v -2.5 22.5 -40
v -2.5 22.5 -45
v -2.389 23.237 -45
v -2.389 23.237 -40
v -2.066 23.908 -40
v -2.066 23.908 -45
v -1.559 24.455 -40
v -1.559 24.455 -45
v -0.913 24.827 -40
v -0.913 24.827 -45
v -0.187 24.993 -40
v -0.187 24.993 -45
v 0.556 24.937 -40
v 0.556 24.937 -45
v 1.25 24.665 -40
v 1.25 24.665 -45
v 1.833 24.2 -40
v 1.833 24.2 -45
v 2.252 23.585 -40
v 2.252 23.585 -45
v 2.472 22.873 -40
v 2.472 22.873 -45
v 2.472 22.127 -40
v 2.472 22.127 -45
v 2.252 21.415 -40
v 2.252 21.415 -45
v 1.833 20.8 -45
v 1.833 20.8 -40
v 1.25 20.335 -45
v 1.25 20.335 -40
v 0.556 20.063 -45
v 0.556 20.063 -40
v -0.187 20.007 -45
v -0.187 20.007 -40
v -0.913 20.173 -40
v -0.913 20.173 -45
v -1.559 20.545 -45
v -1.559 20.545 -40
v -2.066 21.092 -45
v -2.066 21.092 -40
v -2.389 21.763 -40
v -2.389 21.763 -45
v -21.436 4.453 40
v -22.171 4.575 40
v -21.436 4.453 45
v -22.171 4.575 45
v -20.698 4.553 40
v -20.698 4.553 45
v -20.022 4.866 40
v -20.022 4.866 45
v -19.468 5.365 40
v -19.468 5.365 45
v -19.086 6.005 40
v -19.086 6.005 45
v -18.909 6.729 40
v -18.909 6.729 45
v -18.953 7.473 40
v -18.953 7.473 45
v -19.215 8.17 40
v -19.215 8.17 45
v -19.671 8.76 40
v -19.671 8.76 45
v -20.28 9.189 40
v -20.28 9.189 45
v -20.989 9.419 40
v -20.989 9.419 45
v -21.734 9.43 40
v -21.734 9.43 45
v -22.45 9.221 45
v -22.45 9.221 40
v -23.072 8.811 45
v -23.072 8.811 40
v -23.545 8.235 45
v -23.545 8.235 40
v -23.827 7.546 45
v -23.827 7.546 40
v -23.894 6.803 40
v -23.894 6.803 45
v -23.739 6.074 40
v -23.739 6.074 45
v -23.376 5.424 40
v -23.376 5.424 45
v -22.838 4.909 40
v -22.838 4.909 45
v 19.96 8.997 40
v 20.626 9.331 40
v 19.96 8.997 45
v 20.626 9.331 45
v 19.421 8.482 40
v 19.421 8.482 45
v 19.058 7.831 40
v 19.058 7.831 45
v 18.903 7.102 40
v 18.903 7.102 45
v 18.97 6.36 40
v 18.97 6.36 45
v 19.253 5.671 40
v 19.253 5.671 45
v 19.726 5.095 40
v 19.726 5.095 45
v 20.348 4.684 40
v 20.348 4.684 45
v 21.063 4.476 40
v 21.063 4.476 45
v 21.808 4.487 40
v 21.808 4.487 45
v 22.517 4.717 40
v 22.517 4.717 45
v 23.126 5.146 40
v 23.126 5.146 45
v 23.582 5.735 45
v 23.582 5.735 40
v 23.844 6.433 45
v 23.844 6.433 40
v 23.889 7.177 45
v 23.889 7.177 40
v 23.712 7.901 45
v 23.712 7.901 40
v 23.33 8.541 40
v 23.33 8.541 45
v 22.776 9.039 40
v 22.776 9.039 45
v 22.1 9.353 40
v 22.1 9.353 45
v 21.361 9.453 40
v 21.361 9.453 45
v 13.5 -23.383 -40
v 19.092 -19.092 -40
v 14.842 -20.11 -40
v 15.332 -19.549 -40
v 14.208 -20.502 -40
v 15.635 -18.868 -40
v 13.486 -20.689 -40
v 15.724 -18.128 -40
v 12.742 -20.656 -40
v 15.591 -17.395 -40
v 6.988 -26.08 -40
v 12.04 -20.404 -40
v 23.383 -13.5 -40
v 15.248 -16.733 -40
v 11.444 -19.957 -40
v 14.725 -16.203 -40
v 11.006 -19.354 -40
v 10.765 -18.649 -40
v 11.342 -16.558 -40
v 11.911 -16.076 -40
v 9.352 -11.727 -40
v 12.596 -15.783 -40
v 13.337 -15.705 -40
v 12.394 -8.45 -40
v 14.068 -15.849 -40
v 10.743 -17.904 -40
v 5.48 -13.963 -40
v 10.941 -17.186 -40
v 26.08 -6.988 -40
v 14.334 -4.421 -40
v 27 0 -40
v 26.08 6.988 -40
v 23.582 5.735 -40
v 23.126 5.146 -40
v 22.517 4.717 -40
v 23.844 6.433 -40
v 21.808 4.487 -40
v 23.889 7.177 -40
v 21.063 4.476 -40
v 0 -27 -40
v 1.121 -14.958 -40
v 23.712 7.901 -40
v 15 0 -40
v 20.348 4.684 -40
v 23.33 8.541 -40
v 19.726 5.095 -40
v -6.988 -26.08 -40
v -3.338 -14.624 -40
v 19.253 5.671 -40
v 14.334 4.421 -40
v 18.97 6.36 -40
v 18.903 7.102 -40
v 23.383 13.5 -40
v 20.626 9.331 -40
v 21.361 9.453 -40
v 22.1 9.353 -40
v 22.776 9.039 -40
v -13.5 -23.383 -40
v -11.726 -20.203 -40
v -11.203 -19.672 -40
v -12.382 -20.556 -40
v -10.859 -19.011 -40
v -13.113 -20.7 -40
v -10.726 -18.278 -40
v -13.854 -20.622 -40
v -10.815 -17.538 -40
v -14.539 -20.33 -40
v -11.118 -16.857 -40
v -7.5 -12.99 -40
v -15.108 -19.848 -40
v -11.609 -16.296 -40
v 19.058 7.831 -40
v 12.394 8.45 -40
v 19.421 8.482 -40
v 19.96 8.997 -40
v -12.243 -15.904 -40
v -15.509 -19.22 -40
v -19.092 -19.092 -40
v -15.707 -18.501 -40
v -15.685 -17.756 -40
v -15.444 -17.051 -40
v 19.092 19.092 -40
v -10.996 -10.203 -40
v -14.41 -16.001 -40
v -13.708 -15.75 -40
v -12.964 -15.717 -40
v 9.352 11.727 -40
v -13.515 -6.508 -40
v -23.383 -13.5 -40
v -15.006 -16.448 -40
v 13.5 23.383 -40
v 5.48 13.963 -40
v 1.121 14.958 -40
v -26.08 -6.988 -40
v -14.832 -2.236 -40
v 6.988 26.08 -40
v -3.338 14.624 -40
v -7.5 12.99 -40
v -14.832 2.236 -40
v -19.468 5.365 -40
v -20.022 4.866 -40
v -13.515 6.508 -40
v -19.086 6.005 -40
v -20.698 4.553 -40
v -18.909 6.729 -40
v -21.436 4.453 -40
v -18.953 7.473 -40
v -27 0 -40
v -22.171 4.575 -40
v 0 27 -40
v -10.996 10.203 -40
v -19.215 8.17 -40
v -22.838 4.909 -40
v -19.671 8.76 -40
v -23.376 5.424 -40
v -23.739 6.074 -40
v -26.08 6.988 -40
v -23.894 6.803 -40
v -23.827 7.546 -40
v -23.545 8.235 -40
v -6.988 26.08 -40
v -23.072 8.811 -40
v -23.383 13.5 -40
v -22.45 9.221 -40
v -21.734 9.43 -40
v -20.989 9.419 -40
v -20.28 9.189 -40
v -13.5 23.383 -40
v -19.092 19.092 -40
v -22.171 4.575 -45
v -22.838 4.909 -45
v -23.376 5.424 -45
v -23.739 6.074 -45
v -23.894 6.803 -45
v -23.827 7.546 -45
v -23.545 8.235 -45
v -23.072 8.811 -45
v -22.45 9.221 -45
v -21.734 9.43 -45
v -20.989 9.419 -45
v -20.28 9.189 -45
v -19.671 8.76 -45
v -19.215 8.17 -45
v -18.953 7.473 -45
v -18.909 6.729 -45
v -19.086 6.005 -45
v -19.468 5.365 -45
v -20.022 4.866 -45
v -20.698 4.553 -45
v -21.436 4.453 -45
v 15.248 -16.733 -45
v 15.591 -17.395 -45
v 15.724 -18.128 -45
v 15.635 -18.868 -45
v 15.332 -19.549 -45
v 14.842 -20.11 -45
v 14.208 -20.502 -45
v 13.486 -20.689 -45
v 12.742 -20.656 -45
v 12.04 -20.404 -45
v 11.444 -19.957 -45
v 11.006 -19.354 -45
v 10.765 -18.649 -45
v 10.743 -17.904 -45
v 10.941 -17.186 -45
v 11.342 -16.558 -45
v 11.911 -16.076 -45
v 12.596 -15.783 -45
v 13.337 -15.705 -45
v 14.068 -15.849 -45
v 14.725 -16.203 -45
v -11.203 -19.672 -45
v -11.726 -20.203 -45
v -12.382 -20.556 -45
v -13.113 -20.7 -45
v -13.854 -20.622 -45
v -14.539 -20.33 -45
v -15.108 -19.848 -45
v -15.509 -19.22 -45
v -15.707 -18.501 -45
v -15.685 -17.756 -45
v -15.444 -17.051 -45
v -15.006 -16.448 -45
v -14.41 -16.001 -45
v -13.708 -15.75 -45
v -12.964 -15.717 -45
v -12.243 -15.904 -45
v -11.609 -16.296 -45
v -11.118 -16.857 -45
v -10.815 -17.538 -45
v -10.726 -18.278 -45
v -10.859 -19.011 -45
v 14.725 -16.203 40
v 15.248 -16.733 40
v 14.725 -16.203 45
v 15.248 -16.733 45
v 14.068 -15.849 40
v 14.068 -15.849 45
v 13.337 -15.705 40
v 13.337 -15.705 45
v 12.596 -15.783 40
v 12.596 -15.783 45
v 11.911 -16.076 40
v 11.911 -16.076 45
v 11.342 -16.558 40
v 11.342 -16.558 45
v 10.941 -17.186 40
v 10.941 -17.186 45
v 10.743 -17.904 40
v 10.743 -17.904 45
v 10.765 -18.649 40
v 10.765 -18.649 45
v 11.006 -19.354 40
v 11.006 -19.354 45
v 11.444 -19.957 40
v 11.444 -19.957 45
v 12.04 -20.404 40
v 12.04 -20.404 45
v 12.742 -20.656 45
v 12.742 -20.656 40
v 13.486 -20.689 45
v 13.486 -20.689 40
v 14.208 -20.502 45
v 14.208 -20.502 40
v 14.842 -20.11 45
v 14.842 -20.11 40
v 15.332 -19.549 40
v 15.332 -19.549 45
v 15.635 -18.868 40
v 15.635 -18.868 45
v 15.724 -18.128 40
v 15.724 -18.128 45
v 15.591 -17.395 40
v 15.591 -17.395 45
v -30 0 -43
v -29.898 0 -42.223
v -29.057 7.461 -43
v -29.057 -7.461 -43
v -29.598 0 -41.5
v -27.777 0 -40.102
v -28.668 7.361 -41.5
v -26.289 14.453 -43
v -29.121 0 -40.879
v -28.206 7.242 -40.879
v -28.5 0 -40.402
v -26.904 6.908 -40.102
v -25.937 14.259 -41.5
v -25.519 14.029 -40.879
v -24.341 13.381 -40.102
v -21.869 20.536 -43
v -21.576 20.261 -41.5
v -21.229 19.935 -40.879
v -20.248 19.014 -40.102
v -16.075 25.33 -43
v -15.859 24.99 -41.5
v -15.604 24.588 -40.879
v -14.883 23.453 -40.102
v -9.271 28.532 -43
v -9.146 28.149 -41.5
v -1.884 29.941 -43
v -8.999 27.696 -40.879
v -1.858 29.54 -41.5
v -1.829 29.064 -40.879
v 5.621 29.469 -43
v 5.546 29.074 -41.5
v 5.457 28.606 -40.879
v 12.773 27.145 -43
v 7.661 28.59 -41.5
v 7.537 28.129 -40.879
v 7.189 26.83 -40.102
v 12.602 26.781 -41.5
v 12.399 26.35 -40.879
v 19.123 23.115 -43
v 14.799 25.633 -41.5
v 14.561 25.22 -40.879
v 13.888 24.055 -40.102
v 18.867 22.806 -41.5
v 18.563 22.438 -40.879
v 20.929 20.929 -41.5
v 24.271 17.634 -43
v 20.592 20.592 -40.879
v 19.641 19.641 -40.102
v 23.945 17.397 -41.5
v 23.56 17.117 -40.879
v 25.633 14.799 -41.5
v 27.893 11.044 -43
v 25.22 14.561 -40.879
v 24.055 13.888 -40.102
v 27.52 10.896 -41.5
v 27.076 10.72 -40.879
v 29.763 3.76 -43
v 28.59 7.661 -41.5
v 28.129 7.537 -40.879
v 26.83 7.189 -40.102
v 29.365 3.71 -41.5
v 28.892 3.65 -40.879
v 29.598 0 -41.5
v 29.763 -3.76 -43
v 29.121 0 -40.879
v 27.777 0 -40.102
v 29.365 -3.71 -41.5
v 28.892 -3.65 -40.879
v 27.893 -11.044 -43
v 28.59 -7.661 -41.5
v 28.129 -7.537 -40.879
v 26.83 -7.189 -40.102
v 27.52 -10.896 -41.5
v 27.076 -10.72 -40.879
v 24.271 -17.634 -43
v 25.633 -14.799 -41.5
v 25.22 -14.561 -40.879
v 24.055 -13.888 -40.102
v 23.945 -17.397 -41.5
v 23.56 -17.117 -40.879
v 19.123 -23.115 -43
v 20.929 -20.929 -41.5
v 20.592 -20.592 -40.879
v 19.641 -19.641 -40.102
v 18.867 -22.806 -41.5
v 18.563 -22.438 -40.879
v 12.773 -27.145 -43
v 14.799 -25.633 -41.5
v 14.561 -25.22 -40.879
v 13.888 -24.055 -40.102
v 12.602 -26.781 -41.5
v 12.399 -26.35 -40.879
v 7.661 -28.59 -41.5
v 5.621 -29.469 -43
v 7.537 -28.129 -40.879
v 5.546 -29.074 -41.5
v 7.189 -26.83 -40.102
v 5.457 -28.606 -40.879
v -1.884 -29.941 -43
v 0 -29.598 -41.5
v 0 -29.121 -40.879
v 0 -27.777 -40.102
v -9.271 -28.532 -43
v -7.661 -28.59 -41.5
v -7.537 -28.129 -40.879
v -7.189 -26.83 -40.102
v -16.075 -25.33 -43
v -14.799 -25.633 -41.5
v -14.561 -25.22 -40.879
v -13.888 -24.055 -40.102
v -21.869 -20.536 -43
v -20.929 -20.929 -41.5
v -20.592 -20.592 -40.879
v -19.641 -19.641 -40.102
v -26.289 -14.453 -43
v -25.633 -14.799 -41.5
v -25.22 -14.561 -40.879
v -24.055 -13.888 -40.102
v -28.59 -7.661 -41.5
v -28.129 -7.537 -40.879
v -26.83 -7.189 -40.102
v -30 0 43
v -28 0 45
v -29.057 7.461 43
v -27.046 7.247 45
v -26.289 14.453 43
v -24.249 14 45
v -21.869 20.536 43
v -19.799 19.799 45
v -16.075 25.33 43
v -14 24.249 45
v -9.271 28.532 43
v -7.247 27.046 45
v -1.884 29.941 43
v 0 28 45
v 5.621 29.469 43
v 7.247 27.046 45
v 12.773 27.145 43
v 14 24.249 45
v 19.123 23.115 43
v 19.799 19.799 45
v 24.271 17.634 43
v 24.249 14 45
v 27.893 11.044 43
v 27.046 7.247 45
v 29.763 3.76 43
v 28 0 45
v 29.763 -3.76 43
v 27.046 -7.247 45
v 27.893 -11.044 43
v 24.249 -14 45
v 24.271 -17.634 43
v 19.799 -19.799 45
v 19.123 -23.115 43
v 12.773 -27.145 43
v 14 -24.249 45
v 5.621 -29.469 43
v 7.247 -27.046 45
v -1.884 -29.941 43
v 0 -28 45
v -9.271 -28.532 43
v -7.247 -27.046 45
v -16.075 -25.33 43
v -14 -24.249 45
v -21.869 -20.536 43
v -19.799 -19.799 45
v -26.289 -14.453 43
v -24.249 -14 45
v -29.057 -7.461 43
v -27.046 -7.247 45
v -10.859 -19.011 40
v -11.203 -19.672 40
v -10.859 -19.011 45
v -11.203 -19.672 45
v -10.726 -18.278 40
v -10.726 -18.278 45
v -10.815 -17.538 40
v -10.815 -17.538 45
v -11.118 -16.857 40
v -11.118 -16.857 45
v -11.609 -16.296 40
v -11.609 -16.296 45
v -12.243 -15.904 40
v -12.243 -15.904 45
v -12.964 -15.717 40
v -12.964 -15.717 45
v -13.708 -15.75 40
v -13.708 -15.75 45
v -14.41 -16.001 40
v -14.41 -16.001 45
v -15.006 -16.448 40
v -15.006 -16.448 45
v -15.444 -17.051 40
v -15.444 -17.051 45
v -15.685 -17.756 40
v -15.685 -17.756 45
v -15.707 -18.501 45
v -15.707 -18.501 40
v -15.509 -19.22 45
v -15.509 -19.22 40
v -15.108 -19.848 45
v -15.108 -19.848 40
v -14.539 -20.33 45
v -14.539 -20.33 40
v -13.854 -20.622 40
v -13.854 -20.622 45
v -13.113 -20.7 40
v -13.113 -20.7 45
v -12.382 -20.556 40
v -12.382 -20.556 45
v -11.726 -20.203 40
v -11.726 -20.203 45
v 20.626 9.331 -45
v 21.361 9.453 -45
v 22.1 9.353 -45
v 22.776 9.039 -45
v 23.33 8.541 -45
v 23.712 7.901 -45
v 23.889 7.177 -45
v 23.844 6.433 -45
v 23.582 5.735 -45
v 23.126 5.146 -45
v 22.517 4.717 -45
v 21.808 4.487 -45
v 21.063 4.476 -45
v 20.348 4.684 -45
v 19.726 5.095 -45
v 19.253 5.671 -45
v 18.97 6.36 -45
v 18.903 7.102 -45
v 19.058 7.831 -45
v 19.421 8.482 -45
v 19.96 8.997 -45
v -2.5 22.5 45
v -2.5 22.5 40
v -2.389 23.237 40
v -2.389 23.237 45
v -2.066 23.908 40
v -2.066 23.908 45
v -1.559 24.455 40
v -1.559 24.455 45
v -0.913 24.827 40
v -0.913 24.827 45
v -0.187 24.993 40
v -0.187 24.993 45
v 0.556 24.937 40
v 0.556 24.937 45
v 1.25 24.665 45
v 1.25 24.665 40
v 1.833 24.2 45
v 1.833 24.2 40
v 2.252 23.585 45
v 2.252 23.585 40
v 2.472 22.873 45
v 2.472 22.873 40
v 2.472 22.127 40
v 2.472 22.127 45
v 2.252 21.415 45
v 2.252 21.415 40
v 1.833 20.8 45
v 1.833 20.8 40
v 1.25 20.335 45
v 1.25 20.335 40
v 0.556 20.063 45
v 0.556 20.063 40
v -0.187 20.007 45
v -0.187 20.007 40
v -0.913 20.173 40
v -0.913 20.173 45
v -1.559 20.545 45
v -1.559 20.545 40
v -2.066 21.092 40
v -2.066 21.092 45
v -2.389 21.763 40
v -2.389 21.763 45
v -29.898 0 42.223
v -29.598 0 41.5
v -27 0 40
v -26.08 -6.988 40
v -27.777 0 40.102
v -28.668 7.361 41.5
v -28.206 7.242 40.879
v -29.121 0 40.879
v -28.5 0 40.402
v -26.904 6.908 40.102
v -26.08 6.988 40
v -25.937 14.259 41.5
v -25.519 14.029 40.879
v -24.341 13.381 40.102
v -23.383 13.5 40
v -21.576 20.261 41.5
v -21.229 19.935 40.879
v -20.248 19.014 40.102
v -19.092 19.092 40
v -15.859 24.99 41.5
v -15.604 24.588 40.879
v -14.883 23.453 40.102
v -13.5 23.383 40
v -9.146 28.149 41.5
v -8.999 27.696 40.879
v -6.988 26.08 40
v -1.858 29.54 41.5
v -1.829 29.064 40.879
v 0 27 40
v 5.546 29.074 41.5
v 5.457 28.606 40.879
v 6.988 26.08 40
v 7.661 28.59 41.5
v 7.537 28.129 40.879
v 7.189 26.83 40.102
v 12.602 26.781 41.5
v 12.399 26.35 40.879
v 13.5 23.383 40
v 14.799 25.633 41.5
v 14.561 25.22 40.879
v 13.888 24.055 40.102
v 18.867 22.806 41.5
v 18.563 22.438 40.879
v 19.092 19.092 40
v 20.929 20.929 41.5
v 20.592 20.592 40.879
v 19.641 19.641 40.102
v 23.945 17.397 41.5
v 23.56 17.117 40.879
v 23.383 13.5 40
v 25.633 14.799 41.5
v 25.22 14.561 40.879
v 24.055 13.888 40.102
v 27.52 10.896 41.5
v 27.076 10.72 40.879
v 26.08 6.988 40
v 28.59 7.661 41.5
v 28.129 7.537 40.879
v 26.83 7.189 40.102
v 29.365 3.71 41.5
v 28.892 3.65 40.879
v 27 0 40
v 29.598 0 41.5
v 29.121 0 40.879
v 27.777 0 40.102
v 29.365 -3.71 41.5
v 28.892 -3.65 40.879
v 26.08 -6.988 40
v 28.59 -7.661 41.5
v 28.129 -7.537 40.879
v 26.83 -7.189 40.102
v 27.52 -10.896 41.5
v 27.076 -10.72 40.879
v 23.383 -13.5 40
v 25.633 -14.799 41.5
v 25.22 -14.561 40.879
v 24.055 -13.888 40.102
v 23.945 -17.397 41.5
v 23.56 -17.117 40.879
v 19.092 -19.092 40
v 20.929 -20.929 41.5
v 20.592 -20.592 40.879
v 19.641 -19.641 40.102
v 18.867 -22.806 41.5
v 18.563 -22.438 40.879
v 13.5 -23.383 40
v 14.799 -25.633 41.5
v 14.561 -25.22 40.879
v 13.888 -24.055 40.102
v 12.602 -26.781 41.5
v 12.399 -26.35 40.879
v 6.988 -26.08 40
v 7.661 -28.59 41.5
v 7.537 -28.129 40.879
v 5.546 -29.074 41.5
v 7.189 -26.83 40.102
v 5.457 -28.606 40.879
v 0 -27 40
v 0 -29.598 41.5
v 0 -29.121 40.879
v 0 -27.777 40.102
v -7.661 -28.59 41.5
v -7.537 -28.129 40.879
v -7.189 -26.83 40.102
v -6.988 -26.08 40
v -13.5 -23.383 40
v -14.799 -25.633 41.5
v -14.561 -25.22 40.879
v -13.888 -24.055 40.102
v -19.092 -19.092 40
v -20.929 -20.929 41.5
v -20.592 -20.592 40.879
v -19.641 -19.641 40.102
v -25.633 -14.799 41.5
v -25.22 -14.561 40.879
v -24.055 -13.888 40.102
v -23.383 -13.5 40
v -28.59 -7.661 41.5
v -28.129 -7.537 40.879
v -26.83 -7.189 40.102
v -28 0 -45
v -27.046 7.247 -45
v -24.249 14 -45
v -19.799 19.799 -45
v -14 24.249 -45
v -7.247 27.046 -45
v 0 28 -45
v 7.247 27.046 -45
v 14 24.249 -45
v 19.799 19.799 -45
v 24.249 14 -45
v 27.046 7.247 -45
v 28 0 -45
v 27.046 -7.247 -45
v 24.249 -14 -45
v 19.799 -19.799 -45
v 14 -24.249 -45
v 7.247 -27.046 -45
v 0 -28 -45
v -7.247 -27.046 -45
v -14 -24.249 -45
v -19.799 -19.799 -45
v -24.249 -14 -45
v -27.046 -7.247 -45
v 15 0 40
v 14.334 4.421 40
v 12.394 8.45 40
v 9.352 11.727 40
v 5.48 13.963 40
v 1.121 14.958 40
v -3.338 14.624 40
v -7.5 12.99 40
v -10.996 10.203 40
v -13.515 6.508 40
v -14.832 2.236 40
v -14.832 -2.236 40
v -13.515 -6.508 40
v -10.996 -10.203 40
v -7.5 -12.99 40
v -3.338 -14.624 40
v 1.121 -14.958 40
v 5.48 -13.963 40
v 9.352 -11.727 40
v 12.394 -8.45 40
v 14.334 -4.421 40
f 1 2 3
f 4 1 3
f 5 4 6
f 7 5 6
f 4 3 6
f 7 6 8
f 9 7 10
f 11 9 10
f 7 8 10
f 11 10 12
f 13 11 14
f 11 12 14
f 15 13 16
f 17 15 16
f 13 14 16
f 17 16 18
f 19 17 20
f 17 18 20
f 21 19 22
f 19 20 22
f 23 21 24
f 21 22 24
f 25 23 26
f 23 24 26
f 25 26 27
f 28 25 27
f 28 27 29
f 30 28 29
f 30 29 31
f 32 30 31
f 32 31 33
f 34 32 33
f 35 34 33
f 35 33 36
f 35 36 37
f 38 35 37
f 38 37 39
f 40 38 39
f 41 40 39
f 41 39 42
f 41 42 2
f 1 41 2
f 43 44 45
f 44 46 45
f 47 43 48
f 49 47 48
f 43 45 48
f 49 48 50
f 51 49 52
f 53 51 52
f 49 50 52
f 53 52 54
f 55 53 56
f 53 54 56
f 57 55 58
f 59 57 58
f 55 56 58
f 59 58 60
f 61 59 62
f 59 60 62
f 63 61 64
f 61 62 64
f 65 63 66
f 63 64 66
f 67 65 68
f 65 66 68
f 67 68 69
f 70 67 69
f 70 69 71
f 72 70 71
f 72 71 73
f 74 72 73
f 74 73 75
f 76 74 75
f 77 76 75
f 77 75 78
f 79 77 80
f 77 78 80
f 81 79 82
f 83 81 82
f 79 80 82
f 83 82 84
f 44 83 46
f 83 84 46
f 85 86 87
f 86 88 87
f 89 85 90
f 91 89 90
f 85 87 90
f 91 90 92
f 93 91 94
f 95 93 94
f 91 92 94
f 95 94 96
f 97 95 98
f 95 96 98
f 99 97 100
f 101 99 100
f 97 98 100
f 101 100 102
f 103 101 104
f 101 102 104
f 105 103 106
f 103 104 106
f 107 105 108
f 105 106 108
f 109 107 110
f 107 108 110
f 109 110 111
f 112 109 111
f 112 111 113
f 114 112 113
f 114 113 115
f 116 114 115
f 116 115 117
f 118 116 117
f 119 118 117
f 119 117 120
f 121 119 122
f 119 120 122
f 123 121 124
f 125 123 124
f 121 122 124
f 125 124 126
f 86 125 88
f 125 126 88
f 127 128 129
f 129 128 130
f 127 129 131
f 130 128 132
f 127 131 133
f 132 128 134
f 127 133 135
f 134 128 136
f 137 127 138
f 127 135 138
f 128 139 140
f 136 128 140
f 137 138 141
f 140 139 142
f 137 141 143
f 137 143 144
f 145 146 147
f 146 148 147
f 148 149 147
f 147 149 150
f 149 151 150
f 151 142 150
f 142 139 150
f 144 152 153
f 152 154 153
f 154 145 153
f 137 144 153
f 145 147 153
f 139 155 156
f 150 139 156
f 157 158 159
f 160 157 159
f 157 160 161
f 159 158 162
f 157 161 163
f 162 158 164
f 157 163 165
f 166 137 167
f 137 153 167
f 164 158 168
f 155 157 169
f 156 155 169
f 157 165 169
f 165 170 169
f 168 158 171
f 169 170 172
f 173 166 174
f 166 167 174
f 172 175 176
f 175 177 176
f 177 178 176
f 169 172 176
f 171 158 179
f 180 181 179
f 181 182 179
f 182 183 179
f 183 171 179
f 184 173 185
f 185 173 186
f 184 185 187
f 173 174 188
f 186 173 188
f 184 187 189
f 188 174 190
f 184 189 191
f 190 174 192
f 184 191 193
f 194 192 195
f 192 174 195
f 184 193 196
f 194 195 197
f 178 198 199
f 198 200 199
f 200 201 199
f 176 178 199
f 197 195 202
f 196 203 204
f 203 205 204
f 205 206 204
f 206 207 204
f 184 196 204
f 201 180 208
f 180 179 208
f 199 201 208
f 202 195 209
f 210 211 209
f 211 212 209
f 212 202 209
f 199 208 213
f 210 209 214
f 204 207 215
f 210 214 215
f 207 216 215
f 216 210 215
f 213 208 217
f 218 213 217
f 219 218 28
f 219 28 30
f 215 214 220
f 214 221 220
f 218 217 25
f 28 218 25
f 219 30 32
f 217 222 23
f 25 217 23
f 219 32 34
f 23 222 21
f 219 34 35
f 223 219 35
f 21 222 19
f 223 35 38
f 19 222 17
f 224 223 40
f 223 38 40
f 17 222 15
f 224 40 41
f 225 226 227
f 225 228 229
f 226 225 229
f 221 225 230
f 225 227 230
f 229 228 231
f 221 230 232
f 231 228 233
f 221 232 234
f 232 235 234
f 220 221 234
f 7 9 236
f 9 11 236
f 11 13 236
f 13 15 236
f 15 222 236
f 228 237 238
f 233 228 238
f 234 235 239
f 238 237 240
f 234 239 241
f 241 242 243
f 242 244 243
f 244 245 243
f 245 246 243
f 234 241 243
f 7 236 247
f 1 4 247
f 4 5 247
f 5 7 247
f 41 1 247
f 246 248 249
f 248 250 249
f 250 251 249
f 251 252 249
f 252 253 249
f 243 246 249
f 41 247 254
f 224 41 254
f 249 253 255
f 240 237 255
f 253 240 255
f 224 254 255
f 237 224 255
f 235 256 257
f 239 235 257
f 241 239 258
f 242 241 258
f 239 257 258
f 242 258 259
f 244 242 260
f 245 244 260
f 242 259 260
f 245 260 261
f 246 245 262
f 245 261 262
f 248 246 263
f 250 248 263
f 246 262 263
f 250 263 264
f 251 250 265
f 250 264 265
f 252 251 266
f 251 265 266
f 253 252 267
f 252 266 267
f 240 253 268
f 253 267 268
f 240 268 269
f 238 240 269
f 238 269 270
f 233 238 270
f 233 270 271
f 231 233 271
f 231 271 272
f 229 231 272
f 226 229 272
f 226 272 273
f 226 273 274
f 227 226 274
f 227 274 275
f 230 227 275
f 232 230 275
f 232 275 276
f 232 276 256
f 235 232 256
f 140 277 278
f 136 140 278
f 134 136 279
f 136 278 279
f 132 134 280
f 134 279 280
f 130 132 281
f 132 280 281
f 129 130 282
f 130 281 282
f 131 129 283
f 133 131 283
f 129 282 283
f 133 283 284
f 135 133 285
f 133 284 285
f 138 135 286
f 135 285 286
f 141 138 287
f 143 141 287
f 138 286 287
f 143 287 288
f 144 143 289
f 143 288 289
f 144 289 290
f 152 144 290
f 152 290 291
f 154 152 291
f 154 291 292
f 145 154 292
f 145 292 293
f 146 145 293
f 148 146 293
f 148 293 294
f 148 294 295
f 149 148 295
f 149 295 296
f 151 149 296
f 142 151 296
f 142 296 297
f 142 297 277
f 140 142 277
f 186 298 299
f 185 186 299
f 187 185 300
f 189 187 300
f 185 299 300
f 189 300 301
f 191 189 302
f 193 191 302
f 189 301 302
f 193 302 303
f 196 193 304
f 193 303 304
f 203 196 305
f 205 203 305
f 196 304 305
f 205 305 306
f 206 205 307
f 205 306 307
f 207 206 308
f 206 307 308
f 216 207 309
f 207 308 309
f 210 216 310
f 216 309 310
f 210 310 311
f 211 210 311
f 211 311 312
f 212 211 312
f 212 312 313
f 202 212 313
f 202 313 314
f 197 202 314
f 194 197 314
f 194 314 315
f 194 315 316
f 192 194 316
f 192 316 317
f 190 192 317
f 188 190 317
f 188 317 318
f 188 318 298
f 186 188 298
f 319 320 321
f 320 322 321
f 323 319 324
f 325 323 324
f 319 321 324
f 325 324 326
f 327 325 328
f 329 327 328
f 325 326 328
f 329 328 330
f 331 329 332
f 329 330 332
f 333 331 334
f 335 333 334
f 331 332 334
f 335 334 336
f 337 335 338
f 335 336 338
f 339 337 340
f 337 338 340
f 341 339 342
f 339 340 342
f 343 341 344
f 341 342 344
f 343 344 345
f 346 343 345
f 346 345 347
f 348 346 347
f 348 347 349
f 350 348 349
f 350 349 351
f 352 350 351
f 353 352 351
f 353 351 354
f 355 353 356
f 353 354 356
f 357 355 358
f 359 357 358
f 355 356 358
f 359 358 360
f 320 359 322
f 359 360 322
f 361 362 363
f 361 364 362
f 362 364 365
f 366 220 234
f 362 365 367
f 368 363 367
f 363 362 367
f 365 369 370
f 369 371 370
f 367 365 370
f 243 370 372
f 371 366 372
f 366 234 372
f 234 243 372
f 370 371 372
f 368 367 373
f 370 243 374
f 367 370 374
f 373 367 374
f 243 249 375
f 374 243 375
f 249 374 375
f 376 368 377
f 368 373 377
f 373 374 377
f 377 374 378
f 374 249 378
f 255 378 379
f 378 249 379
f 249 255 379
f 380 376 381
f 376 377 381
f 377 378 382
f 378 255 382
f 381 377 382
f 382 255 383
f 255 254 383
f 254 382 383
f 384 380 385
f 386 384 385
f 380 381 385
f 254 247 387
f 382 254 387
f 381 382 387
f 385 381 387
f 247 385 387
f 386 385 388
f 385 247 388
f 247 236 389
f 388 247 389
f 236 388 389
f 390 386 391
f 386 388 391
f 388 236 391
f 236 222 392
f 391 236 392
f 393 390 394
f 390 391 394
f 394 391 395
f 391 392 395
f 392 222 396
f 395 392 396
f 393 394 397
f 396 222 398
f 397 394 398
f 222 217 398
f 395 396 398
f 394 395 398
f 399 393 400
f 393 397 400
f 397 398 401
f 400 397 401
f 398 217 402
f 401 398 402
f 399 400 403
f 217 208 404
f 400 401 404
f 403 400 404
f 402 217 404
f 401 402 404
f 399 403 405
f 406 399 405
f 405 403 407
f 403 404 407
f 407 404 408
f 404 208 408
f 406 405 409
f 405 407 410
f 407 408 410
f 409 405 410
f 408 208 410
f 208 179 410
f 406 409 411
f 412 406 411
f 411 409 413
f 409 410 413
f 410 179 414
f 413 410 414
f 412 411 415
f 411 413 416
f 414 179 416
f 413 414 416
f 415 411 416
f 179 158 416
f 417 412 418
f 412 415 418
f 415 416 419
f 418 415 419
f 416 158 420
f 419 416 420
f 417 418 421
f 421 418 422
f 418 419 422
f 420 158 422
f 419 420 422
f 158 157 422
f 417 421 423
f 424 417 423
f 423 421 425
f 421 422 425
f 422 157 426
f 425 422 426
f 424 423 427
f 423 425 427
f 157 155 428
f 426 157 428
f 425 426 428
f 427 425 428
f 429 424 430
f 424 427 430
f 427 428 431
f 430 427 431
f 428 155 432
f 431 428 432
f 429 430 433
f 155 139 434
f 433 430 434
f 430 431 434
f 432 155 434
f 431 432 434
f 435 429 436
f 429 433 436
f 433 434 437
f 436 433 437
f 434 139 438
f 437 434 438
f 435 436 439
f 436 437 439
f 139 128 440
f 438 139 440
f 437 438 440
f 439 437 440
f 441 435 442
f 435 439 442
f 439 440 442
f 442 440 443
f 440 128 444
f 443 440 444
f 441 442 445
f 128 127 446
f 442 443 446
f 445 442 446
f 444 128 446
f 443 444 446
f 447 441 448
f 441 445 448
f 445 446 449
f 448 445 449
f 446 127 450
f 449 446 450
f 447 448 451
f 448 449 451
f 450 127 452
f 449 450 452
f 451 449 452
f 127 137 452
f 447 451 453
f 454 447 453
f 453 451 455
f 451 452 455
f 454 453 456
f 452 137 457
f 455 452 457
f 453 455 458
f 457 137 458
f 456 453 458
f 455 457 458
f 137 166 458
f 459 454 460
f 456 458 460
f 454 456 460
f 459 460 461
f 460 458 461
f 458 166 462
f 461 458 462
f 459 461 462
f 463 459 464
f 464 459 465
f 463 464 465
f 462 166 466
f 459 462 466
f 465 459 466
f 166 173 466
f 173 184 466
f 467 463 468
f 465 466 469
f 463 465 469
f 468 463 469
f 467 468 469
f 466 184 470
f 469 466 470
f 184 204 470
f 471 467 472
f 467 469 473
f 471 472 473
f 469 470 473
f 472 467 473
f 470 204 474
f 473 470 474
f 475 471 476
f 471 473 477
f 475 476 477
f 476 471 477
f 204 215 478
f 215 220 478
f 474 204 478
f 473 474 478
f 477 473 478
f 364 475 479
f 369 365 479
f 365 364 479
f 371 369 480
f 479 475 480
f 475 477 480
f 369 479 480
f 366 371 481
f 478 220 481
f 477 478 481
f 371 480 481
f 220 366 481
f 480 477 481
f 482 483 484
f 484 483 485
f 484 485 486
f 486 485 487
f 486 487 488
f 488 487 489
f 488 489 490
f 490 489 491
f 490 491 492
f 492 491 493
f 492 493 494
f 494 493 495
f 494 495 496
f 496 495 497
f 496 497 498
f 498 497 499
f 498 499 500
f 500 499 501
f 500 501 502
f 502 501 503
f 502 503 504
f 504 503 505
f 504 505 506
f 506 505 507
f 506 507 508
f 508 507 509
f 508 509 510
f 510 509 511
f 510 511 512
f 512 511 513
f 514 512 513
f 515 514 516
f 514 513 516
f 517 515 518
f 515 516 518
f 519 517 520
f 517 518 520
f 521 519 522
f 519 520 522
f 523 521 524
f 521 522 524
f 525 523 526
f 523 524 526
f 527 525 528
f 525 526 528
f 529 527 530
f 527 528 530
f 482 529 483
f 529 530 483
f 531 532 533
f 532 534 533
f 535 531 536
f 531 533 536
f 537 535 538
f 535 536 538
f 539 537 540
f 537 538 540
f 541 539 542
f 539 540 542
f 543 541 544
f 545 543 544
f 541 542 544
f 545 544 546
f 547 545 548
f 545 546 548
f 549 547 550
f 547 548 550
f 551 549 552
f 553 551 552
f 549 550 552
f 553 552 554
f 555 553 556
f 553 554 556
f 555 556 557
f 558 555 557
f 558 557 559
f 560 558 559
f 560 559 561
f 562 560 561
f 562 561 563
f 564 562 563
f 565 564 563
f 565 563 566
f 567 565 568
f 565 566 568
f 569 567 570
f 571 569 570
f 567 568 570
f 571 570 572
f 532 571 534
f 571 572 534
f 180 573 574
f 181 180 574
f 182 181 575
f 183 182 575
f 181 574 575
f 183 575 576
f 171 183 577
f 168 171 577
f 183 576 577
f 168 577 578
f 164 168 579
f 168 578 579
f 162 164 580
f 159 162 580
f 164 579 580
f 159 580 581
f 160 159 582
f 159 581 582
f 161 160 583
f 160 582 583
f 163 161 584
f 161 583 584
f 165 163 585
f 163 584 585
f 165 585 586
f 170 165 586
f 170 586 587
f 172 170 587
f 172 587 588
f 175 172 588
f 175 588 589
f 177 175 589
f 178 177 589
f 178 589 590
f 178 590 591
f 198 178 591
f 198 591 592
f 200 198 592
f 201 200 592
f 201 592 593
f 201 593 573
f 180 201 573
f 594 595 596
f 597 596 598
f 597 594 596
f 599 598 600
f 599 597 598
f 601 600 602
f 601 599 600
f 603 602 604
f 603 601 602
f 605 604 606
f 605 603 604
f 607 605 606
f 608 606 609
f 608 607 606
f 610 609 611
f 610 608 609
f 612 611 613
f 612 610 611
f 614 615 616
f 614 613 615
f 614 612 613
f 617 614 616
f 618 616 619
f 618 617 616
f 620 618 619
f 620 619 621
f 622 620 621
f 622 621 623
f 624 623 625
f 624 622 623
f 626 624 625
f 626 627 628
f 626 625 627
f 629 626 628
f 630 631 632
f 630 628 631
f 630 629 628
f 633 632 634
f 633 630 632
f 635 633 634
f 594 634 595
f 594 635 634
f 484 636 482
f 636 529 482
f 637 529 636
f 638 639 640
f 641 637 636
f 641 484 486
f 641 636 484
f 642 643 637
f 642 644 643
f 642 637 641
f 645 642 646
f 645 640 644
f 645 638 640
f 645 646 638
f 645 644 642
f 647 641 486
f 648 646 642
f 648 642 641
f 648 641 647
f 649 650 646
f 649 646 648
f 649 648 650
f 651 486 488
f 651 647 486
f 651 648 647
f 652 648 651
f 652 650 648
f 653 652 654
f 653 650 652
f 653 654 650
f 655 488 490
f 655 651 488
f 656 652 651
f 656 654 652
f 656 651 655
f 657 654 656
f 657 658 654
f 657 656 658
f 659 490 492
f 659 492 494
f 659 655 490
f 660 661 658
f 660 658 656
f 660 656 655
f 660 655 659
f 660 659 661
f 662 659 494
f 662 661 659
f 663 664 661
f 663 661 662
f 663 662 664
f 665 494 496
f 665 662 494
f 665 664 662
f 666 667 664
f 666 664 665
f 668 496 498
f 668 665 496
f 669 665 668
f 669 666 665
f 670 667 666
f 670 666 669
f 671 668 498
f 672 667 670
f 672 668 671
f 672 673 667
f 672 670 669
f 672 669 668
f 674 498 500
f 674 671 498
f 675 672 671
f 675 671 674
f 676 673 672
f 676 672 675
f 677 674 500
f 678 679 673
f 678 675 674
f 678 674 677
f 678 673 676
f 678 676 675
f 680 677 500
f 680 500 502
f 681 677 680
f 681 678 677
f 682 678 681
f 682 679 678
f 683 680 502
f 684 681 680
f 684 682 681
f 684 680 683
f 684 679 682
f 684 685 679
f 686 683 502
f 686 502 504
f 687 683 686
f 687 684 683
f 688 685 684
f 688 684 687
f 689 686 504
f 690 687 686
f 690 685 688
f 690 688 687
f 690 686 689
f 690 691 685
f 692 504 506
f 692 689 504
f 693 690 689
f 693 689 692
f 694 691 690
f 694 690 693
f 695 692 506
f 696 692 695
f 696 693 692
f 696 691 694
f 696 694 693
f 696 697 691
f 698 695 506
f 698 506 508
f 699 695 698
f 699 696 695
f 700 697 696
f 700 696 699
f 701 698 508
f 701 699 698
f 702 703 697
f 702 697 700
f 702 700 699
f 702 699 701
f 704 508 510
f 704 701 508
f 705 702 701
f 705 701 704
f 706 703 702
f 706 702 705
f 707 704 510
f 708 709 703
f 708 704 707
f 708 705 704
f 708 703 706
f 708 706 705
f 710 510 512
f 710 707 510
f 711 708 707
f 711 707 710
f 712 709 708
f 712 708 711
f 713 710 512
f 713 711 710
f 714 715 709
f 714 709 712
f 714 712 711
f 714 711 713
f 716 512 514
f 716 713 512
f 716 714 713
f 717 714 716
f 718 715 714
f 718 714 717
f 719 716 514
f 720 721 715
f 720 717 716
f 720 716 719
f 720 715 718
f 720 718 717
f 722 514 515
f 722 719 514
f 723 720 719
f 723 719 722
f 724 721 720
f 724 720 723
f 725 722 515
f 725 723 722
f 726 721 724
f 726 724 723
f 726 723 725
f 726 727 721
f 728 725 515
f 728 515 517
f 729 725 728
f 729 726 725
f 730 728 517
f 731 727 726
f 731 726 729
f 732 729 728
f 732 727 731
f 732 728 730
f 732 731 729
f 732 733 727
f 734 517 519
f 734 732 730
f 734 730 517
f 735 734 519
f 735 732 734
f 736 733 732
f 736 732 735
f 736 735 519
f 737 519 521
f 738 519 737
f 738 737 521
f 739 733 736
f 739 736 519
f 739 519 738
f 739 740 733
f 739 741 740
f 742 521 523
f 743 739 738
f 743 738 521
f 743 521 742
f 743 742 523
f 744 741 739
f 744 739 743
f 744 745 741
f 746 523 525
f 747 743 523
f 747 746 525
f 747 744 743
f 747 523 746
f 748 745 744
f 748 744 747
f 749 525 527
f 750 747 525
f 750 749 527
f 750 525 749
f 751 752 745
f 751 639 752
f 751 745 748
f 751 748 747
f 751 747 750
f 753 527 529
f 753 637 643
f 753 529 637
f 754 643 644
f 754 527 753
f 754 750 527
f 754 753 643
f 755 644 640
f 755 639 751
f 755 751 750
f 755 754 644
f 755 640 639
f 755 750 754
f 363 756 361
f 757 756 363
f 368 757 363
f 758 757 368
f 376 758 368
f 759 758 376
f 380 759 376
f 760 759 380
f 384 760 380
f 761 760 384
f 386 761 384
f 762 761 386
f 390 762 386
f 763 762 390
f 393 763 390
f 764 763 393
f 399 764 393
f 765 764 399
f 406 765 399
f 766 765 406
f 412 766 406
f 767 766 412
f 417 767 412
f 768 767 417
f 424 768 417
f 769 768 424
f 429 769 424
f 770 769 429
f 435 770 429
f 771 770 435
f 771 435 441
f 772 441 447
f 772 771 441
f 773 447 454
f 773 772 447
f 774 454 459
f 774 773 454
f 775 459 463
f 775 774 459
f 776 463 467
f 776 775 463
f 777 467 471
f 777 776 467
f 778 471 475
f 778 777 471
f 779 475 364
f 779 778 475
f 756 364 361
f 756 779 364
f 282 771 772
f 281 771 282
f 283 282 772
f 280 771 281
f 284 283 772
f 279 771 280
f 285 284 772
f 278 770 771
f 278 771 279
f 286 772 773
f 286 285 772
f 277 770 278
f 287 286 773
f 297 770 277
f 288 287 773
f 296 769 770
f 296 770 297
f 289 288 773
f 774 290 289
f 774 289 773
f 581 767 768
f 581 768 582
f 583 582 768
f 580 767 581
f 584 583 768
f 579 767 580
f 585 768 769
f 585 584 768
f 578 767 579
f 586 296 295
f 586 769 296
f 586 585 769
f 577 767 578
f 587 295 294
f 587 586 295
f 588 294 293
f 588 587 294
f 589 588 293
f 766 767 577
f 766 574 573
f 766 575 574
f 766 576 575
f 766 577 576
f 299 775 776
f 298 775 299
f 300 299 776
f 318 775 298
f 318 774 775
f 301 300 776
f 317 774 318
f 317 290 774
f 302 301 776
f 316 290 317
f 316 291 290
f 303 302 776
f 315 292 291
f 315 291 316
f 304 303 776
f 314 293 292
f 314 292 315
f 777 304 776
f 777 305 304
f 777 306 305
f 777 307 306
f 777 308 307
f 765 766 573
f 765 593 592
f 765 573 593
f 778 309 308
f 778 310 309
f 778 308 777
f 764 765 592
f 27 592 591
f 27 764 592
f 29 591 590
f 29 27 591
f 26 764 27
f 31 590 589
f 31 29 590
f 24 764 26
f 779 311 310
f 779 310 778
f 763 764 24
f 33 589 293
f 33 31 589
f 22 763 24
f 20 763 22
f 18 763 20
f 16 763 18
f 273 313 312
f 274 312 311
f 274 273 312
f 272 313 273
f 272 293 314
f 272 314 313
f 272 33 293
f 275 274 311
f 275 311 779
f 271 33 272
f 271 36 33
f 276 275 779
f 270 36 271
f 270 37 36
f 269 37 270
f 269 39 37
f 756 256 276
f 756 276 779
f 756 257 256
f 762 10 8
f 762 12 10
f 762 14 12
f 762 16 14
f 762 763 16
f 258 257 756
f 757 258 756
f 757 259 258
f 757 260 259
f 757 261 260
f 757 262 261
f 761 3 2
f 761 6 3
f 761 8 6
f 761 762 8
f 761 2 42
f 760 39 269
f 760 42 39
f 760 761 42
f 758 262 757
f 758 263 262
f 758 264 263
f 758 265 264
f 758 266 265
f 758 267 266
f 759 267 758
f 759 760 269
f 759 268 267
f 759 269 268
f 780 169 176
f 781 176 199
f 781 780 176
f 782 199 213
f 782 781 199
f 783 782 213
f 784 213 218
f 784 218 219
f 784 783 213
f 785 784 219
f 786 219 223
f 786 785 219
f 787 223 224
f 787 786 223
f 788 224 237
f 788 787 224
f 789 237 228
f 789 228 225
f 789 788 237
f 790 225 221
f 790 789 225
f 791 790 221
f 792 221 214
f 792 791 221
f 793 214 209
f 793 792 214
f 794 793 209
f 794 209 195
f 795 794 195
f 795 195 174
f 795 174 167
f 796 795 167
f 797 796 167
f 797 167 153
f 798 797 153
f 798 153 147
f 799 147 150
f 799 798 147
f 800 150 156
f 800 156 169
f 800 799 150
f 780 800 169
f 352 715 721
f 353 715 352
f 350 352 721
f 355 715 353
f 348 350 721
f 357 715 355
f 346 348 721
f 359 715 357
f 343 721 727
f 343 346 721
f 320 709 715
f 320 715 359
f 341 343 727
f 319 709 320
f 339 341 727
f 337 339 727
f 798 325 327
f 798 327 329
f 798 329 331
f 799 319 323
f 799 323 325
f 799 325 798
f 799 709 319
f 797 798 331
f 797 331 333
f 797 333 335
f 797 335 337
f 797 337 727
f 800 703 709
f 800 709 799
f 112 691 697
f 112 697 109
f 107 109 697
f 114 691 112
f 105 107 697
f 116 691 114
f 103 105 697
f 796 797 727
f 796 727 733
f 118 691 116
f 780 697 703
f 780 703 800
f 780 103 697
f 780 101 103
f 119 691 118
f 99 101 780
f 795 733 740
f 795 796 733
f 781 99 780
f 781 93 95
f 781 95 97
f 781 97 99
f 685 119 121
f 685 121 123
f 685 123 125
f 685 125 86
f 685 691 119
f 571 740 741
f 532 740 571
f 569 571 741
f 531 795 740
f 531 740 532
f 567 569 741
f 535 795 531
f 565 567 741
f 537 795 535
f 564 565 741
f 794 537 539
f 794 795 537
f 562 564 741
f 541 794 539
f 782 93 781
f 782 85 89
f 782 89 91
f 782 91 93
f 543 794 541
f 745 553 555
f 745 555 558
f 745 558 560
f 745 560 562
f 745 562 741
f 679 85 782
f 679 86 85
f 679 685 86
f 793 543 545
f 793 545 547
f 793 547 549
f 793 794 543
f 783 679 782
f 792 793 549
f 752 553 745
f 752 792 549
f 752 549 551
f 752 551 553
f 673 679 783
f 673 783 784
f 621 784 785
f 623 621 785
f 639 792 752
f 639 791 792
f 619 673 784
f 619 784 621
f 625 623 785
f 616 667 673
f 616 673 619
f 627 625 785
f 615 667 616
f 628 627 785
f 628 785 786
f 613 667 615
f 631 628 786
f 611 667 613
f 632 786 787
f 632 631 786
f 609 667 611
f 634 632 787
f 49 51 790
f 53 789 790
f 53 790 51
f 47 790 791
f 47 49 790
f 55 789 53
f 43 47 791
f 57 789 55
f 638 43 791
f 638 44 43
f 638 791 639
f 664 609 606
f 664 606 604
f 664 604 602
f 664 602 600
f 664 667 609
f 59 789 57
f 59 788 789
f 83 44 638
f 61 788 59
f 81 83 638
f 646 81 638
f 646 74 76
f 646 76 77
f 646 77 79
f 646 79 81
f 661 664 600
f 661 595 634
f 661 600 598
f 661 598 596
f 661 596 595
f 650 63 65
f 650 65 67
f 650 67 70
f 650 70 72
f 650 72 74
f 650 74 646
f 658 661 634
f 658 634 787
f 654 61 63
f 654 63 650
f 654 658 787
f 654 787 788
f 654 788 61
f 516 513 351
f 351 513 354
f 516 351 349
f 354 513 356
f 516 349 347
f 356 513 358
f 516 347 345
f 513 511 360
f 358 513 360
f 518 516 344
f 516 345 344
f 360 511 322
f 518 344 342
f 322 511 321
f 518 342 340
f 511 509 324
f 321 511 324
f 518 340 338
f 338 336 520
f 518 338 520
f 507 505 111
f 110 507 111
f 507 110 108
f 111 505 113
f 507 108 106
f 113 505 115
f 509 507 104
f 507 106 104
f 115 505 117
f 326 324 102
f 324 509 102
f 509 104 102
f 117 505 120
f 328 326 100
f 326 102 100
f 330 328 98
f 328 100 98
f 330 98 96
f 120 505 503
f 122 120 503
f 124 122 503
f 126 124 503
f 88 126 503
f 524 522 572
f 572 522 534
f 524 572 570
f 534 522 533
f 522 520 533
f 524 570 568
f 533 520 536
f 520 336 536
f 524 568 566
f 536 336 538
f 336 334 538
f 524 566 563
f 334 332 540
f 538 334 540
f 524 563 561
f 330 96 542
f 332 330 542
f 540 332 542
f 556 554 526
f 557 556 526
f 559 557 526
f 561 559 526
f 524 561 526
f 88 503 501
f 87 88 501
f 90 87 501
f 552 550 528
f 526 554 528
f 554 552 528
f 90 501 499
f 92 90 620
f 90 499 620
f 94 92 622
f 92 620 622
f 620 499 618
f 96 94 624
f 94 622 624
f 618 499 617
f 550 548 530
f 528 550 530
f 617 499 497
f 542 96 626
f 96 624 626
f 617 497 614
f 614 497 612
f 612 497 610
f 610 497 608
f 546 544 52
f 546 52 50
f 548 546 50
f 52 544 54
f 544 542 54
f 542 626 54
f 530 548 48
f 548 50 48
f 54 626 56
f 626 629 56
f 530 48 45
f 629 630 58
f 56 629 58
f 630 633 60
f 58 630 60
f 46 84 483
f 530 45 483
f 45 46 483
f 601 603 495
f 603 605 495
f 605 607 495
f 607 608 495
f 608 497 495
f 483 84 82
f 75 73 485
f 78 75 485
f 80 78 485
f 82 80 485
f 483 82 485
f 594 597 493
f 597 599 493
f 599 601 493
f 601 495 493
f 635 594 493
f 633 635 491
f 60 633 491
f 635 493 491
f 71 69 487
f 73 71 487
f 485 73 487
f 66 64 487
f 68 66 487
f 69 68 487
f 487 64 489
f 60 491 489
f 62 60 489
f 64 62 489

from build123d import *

# Parameters (mm, degrees)
SKETCH1_R                = 15
BOSS_EXTRUDE1_DEPTH      = 40
SKETCH2_R                = 30
BOSS_EXTRUDE2_DEPTH      = 5
CHAMFER1_SIZE            = 2
SKETCH5_R                = 2.5
CUT_EXTRUDE1_DEPTH       = 96
CIRPATTERN1_COUNT        = 5
FILLET1_R                = 3
MIRROR2_COPY_1_SKETCH_R  = 2.5
MIRROR2_COPY_1_DEPTH     = 96
MIRROR2_COPY_2_SKETCH_R  = 2.5
MIRROR2_COPY_2_DEPTH     = 96
MIRROR2_COPY_3_SKETCH_R  = 2.5
MIRROR2_COPY_3_DEPTH     = 96
MIRROR2_COPY_4_SKETCH_R  = 2.5
MIRROR2_COPY_4_DEPTH     = 96
CHAMFER1_OF_MIRROR2_SIZE = 2
FILLET1_OF_MIRROR2_R     = 3


with BuildPart() as part:
    # Sketch1 → Boss-Extrude1 (new, symmetric)
    with BuildSketch(Plane.XY):
        Circle(SKETCH1_R)
    extrude(amount=BOSS_EXTRUDE1_DEPTH, both=True)

    # Sketch2 → Boss-Extrude2 (add)
    with BuildSketch(Plane(origin=(0, 0, -40), x_dir=(-1, 0, 0), z_dir=(0, 0, -1))):
        Circle(SKETCH2_R)
    boss_extrude2 = extrude(amount=BOSS_EXTRUDE2_DEPTH)

    # Chamfer1
    chamfer1_edges = [part.edges().sort_by_distance(p)[0] for p in [
        (30, 0, -45),
    ]]
    chamfer(chamfer1_edges, length=CHAMFER1_SIZE)

    # Sketch5 → Cut-Extrude1 (cut, through all)
    with BuildSketch(Plane(origin=(0, 0, -45), x_dir=(-1, 0, 0), z_dir=(0, 0, -1))):
        with Locations((0, 22.5)):
            Circle(SKETCH5_R)
    cut_extrude1 = extrude(amount=-CUT_EXTRUDE1_DEPTH, mode=Mode.SUBTRACT)

    # CirPattern1: Cut-Extrude1 ×5 about axis
    cirpattern1_axis = Axis((0, 0, 0), (0, 0, 1))
    for i in range(1, CIRPATTERN1_COUNT):
        add(cut_extrude1.rotate(cirpattern1_axis, i * 360 / CIRPATTERN1_COUNT), mode=Mode.SUBTRACT)

    # Fillet1
    fillet1_edges = [part.edges().sort_by_distance(p)[0] for p in [
        (30, 0, -40),
    ]]
    fillet(fillet1_edges, radius=FILLET1_R - 0.0001)  # a hair under: the kernel refuses the full size

    # Mirror2: Boss-Extrude2, Cut-Extrude1 across plane
    add(boss_extrude2.mirror(Plane.XY))
    add(cut_extrude1.mirror(Plane.XY), mode=Mode.SUBTRACT)

    # Mirror2 copy 1 sketch → Mirror2 copy 1 (cut, through all)
    with BuildSketch(Plane(origin=(0, 0, 45), x_dir=(-0.30901699437494745, -0.9510565162951535, 0), z_dir=(0, 0, 1))):
        with Locations((0, -22.5)):
            Circle(MIRROR2_COPY_1_SKETCH_R)
    extrude(amount=-MIRROR2_COPY_1_DEPTH, mode=Mode.SUBTRACT)

    # Mirror2 copy 2 sketch → Mirror2 copy 2 (cut, through all)
    with BuildSketch(Plane(origin=(0, 0, 45), x_dir=(0.8090169943749473, -0.5877852522924732, 0), z_dir=(0, 0, 1))):
        with Locations((0, -22.5)):
            Circle(MIRROR2_COPY_2_SKETCH_R)
    extrude(amount=-MIRROR2_COPY_2_DEPTH, mode=Mode.SUBTRACT)

    # Mirror2 copy 3 sketch → Mirror2 copy 3 (cut, through all)
    with BuildSketch(Plane(origin=(0, 0, 45), x_dir=(0.8090169943749476, 0.587785252292473, 0), z_dir=(0, 0, 1))):
        with Locations((0, -22.5)):
            Circle(MIRROR2_COPY_3_SKETCH_R)
    extrude(amount=-MIRROR2_COPY_3_DEPTH, mode=Mode.SUBTRACT)

    # Mirror2 copy 4 sketch → Mirror2 copy 4 (cut, through all)
    with BuildSketch(Plane(origin=(0, 0, 45), x_dir=(-0.30901699437494723, 0.9510565162951536, 0), z_dir=(0, 0, 1))):
        with Locations((0, -22.5)):
            Circle(MIRROR2_COPY_4_SKETCH_R)
    extrude(amount=-MIRROR2_COPY_4_DEPTH, mode=Mode.SUBTRACT)

    # Chamfer1 of Mirror2
    chamfer1_of_mirror2_edges = [part.edges().sort_by_distance(p)[0] for p in [
        (30, 0, 45),
    ]]
    chamfer(chamfer1_of_mirror2_edges, length=CHAMFER1_OF_MIRROR2_SIZE)

    # Fillet1 of Mirror2
    fillet1_of_mirror2_edges = [part.edges().sort_by_distance(p)[0] for p in [
        (30, 0, 40),
    ]]
    fillet(fillet1_of_mirror2_edges, radius=FILLET1_OF_MIRROR2_R - 0.0001)  # a hair under: the kernel refuses the full size


solid = part.part
